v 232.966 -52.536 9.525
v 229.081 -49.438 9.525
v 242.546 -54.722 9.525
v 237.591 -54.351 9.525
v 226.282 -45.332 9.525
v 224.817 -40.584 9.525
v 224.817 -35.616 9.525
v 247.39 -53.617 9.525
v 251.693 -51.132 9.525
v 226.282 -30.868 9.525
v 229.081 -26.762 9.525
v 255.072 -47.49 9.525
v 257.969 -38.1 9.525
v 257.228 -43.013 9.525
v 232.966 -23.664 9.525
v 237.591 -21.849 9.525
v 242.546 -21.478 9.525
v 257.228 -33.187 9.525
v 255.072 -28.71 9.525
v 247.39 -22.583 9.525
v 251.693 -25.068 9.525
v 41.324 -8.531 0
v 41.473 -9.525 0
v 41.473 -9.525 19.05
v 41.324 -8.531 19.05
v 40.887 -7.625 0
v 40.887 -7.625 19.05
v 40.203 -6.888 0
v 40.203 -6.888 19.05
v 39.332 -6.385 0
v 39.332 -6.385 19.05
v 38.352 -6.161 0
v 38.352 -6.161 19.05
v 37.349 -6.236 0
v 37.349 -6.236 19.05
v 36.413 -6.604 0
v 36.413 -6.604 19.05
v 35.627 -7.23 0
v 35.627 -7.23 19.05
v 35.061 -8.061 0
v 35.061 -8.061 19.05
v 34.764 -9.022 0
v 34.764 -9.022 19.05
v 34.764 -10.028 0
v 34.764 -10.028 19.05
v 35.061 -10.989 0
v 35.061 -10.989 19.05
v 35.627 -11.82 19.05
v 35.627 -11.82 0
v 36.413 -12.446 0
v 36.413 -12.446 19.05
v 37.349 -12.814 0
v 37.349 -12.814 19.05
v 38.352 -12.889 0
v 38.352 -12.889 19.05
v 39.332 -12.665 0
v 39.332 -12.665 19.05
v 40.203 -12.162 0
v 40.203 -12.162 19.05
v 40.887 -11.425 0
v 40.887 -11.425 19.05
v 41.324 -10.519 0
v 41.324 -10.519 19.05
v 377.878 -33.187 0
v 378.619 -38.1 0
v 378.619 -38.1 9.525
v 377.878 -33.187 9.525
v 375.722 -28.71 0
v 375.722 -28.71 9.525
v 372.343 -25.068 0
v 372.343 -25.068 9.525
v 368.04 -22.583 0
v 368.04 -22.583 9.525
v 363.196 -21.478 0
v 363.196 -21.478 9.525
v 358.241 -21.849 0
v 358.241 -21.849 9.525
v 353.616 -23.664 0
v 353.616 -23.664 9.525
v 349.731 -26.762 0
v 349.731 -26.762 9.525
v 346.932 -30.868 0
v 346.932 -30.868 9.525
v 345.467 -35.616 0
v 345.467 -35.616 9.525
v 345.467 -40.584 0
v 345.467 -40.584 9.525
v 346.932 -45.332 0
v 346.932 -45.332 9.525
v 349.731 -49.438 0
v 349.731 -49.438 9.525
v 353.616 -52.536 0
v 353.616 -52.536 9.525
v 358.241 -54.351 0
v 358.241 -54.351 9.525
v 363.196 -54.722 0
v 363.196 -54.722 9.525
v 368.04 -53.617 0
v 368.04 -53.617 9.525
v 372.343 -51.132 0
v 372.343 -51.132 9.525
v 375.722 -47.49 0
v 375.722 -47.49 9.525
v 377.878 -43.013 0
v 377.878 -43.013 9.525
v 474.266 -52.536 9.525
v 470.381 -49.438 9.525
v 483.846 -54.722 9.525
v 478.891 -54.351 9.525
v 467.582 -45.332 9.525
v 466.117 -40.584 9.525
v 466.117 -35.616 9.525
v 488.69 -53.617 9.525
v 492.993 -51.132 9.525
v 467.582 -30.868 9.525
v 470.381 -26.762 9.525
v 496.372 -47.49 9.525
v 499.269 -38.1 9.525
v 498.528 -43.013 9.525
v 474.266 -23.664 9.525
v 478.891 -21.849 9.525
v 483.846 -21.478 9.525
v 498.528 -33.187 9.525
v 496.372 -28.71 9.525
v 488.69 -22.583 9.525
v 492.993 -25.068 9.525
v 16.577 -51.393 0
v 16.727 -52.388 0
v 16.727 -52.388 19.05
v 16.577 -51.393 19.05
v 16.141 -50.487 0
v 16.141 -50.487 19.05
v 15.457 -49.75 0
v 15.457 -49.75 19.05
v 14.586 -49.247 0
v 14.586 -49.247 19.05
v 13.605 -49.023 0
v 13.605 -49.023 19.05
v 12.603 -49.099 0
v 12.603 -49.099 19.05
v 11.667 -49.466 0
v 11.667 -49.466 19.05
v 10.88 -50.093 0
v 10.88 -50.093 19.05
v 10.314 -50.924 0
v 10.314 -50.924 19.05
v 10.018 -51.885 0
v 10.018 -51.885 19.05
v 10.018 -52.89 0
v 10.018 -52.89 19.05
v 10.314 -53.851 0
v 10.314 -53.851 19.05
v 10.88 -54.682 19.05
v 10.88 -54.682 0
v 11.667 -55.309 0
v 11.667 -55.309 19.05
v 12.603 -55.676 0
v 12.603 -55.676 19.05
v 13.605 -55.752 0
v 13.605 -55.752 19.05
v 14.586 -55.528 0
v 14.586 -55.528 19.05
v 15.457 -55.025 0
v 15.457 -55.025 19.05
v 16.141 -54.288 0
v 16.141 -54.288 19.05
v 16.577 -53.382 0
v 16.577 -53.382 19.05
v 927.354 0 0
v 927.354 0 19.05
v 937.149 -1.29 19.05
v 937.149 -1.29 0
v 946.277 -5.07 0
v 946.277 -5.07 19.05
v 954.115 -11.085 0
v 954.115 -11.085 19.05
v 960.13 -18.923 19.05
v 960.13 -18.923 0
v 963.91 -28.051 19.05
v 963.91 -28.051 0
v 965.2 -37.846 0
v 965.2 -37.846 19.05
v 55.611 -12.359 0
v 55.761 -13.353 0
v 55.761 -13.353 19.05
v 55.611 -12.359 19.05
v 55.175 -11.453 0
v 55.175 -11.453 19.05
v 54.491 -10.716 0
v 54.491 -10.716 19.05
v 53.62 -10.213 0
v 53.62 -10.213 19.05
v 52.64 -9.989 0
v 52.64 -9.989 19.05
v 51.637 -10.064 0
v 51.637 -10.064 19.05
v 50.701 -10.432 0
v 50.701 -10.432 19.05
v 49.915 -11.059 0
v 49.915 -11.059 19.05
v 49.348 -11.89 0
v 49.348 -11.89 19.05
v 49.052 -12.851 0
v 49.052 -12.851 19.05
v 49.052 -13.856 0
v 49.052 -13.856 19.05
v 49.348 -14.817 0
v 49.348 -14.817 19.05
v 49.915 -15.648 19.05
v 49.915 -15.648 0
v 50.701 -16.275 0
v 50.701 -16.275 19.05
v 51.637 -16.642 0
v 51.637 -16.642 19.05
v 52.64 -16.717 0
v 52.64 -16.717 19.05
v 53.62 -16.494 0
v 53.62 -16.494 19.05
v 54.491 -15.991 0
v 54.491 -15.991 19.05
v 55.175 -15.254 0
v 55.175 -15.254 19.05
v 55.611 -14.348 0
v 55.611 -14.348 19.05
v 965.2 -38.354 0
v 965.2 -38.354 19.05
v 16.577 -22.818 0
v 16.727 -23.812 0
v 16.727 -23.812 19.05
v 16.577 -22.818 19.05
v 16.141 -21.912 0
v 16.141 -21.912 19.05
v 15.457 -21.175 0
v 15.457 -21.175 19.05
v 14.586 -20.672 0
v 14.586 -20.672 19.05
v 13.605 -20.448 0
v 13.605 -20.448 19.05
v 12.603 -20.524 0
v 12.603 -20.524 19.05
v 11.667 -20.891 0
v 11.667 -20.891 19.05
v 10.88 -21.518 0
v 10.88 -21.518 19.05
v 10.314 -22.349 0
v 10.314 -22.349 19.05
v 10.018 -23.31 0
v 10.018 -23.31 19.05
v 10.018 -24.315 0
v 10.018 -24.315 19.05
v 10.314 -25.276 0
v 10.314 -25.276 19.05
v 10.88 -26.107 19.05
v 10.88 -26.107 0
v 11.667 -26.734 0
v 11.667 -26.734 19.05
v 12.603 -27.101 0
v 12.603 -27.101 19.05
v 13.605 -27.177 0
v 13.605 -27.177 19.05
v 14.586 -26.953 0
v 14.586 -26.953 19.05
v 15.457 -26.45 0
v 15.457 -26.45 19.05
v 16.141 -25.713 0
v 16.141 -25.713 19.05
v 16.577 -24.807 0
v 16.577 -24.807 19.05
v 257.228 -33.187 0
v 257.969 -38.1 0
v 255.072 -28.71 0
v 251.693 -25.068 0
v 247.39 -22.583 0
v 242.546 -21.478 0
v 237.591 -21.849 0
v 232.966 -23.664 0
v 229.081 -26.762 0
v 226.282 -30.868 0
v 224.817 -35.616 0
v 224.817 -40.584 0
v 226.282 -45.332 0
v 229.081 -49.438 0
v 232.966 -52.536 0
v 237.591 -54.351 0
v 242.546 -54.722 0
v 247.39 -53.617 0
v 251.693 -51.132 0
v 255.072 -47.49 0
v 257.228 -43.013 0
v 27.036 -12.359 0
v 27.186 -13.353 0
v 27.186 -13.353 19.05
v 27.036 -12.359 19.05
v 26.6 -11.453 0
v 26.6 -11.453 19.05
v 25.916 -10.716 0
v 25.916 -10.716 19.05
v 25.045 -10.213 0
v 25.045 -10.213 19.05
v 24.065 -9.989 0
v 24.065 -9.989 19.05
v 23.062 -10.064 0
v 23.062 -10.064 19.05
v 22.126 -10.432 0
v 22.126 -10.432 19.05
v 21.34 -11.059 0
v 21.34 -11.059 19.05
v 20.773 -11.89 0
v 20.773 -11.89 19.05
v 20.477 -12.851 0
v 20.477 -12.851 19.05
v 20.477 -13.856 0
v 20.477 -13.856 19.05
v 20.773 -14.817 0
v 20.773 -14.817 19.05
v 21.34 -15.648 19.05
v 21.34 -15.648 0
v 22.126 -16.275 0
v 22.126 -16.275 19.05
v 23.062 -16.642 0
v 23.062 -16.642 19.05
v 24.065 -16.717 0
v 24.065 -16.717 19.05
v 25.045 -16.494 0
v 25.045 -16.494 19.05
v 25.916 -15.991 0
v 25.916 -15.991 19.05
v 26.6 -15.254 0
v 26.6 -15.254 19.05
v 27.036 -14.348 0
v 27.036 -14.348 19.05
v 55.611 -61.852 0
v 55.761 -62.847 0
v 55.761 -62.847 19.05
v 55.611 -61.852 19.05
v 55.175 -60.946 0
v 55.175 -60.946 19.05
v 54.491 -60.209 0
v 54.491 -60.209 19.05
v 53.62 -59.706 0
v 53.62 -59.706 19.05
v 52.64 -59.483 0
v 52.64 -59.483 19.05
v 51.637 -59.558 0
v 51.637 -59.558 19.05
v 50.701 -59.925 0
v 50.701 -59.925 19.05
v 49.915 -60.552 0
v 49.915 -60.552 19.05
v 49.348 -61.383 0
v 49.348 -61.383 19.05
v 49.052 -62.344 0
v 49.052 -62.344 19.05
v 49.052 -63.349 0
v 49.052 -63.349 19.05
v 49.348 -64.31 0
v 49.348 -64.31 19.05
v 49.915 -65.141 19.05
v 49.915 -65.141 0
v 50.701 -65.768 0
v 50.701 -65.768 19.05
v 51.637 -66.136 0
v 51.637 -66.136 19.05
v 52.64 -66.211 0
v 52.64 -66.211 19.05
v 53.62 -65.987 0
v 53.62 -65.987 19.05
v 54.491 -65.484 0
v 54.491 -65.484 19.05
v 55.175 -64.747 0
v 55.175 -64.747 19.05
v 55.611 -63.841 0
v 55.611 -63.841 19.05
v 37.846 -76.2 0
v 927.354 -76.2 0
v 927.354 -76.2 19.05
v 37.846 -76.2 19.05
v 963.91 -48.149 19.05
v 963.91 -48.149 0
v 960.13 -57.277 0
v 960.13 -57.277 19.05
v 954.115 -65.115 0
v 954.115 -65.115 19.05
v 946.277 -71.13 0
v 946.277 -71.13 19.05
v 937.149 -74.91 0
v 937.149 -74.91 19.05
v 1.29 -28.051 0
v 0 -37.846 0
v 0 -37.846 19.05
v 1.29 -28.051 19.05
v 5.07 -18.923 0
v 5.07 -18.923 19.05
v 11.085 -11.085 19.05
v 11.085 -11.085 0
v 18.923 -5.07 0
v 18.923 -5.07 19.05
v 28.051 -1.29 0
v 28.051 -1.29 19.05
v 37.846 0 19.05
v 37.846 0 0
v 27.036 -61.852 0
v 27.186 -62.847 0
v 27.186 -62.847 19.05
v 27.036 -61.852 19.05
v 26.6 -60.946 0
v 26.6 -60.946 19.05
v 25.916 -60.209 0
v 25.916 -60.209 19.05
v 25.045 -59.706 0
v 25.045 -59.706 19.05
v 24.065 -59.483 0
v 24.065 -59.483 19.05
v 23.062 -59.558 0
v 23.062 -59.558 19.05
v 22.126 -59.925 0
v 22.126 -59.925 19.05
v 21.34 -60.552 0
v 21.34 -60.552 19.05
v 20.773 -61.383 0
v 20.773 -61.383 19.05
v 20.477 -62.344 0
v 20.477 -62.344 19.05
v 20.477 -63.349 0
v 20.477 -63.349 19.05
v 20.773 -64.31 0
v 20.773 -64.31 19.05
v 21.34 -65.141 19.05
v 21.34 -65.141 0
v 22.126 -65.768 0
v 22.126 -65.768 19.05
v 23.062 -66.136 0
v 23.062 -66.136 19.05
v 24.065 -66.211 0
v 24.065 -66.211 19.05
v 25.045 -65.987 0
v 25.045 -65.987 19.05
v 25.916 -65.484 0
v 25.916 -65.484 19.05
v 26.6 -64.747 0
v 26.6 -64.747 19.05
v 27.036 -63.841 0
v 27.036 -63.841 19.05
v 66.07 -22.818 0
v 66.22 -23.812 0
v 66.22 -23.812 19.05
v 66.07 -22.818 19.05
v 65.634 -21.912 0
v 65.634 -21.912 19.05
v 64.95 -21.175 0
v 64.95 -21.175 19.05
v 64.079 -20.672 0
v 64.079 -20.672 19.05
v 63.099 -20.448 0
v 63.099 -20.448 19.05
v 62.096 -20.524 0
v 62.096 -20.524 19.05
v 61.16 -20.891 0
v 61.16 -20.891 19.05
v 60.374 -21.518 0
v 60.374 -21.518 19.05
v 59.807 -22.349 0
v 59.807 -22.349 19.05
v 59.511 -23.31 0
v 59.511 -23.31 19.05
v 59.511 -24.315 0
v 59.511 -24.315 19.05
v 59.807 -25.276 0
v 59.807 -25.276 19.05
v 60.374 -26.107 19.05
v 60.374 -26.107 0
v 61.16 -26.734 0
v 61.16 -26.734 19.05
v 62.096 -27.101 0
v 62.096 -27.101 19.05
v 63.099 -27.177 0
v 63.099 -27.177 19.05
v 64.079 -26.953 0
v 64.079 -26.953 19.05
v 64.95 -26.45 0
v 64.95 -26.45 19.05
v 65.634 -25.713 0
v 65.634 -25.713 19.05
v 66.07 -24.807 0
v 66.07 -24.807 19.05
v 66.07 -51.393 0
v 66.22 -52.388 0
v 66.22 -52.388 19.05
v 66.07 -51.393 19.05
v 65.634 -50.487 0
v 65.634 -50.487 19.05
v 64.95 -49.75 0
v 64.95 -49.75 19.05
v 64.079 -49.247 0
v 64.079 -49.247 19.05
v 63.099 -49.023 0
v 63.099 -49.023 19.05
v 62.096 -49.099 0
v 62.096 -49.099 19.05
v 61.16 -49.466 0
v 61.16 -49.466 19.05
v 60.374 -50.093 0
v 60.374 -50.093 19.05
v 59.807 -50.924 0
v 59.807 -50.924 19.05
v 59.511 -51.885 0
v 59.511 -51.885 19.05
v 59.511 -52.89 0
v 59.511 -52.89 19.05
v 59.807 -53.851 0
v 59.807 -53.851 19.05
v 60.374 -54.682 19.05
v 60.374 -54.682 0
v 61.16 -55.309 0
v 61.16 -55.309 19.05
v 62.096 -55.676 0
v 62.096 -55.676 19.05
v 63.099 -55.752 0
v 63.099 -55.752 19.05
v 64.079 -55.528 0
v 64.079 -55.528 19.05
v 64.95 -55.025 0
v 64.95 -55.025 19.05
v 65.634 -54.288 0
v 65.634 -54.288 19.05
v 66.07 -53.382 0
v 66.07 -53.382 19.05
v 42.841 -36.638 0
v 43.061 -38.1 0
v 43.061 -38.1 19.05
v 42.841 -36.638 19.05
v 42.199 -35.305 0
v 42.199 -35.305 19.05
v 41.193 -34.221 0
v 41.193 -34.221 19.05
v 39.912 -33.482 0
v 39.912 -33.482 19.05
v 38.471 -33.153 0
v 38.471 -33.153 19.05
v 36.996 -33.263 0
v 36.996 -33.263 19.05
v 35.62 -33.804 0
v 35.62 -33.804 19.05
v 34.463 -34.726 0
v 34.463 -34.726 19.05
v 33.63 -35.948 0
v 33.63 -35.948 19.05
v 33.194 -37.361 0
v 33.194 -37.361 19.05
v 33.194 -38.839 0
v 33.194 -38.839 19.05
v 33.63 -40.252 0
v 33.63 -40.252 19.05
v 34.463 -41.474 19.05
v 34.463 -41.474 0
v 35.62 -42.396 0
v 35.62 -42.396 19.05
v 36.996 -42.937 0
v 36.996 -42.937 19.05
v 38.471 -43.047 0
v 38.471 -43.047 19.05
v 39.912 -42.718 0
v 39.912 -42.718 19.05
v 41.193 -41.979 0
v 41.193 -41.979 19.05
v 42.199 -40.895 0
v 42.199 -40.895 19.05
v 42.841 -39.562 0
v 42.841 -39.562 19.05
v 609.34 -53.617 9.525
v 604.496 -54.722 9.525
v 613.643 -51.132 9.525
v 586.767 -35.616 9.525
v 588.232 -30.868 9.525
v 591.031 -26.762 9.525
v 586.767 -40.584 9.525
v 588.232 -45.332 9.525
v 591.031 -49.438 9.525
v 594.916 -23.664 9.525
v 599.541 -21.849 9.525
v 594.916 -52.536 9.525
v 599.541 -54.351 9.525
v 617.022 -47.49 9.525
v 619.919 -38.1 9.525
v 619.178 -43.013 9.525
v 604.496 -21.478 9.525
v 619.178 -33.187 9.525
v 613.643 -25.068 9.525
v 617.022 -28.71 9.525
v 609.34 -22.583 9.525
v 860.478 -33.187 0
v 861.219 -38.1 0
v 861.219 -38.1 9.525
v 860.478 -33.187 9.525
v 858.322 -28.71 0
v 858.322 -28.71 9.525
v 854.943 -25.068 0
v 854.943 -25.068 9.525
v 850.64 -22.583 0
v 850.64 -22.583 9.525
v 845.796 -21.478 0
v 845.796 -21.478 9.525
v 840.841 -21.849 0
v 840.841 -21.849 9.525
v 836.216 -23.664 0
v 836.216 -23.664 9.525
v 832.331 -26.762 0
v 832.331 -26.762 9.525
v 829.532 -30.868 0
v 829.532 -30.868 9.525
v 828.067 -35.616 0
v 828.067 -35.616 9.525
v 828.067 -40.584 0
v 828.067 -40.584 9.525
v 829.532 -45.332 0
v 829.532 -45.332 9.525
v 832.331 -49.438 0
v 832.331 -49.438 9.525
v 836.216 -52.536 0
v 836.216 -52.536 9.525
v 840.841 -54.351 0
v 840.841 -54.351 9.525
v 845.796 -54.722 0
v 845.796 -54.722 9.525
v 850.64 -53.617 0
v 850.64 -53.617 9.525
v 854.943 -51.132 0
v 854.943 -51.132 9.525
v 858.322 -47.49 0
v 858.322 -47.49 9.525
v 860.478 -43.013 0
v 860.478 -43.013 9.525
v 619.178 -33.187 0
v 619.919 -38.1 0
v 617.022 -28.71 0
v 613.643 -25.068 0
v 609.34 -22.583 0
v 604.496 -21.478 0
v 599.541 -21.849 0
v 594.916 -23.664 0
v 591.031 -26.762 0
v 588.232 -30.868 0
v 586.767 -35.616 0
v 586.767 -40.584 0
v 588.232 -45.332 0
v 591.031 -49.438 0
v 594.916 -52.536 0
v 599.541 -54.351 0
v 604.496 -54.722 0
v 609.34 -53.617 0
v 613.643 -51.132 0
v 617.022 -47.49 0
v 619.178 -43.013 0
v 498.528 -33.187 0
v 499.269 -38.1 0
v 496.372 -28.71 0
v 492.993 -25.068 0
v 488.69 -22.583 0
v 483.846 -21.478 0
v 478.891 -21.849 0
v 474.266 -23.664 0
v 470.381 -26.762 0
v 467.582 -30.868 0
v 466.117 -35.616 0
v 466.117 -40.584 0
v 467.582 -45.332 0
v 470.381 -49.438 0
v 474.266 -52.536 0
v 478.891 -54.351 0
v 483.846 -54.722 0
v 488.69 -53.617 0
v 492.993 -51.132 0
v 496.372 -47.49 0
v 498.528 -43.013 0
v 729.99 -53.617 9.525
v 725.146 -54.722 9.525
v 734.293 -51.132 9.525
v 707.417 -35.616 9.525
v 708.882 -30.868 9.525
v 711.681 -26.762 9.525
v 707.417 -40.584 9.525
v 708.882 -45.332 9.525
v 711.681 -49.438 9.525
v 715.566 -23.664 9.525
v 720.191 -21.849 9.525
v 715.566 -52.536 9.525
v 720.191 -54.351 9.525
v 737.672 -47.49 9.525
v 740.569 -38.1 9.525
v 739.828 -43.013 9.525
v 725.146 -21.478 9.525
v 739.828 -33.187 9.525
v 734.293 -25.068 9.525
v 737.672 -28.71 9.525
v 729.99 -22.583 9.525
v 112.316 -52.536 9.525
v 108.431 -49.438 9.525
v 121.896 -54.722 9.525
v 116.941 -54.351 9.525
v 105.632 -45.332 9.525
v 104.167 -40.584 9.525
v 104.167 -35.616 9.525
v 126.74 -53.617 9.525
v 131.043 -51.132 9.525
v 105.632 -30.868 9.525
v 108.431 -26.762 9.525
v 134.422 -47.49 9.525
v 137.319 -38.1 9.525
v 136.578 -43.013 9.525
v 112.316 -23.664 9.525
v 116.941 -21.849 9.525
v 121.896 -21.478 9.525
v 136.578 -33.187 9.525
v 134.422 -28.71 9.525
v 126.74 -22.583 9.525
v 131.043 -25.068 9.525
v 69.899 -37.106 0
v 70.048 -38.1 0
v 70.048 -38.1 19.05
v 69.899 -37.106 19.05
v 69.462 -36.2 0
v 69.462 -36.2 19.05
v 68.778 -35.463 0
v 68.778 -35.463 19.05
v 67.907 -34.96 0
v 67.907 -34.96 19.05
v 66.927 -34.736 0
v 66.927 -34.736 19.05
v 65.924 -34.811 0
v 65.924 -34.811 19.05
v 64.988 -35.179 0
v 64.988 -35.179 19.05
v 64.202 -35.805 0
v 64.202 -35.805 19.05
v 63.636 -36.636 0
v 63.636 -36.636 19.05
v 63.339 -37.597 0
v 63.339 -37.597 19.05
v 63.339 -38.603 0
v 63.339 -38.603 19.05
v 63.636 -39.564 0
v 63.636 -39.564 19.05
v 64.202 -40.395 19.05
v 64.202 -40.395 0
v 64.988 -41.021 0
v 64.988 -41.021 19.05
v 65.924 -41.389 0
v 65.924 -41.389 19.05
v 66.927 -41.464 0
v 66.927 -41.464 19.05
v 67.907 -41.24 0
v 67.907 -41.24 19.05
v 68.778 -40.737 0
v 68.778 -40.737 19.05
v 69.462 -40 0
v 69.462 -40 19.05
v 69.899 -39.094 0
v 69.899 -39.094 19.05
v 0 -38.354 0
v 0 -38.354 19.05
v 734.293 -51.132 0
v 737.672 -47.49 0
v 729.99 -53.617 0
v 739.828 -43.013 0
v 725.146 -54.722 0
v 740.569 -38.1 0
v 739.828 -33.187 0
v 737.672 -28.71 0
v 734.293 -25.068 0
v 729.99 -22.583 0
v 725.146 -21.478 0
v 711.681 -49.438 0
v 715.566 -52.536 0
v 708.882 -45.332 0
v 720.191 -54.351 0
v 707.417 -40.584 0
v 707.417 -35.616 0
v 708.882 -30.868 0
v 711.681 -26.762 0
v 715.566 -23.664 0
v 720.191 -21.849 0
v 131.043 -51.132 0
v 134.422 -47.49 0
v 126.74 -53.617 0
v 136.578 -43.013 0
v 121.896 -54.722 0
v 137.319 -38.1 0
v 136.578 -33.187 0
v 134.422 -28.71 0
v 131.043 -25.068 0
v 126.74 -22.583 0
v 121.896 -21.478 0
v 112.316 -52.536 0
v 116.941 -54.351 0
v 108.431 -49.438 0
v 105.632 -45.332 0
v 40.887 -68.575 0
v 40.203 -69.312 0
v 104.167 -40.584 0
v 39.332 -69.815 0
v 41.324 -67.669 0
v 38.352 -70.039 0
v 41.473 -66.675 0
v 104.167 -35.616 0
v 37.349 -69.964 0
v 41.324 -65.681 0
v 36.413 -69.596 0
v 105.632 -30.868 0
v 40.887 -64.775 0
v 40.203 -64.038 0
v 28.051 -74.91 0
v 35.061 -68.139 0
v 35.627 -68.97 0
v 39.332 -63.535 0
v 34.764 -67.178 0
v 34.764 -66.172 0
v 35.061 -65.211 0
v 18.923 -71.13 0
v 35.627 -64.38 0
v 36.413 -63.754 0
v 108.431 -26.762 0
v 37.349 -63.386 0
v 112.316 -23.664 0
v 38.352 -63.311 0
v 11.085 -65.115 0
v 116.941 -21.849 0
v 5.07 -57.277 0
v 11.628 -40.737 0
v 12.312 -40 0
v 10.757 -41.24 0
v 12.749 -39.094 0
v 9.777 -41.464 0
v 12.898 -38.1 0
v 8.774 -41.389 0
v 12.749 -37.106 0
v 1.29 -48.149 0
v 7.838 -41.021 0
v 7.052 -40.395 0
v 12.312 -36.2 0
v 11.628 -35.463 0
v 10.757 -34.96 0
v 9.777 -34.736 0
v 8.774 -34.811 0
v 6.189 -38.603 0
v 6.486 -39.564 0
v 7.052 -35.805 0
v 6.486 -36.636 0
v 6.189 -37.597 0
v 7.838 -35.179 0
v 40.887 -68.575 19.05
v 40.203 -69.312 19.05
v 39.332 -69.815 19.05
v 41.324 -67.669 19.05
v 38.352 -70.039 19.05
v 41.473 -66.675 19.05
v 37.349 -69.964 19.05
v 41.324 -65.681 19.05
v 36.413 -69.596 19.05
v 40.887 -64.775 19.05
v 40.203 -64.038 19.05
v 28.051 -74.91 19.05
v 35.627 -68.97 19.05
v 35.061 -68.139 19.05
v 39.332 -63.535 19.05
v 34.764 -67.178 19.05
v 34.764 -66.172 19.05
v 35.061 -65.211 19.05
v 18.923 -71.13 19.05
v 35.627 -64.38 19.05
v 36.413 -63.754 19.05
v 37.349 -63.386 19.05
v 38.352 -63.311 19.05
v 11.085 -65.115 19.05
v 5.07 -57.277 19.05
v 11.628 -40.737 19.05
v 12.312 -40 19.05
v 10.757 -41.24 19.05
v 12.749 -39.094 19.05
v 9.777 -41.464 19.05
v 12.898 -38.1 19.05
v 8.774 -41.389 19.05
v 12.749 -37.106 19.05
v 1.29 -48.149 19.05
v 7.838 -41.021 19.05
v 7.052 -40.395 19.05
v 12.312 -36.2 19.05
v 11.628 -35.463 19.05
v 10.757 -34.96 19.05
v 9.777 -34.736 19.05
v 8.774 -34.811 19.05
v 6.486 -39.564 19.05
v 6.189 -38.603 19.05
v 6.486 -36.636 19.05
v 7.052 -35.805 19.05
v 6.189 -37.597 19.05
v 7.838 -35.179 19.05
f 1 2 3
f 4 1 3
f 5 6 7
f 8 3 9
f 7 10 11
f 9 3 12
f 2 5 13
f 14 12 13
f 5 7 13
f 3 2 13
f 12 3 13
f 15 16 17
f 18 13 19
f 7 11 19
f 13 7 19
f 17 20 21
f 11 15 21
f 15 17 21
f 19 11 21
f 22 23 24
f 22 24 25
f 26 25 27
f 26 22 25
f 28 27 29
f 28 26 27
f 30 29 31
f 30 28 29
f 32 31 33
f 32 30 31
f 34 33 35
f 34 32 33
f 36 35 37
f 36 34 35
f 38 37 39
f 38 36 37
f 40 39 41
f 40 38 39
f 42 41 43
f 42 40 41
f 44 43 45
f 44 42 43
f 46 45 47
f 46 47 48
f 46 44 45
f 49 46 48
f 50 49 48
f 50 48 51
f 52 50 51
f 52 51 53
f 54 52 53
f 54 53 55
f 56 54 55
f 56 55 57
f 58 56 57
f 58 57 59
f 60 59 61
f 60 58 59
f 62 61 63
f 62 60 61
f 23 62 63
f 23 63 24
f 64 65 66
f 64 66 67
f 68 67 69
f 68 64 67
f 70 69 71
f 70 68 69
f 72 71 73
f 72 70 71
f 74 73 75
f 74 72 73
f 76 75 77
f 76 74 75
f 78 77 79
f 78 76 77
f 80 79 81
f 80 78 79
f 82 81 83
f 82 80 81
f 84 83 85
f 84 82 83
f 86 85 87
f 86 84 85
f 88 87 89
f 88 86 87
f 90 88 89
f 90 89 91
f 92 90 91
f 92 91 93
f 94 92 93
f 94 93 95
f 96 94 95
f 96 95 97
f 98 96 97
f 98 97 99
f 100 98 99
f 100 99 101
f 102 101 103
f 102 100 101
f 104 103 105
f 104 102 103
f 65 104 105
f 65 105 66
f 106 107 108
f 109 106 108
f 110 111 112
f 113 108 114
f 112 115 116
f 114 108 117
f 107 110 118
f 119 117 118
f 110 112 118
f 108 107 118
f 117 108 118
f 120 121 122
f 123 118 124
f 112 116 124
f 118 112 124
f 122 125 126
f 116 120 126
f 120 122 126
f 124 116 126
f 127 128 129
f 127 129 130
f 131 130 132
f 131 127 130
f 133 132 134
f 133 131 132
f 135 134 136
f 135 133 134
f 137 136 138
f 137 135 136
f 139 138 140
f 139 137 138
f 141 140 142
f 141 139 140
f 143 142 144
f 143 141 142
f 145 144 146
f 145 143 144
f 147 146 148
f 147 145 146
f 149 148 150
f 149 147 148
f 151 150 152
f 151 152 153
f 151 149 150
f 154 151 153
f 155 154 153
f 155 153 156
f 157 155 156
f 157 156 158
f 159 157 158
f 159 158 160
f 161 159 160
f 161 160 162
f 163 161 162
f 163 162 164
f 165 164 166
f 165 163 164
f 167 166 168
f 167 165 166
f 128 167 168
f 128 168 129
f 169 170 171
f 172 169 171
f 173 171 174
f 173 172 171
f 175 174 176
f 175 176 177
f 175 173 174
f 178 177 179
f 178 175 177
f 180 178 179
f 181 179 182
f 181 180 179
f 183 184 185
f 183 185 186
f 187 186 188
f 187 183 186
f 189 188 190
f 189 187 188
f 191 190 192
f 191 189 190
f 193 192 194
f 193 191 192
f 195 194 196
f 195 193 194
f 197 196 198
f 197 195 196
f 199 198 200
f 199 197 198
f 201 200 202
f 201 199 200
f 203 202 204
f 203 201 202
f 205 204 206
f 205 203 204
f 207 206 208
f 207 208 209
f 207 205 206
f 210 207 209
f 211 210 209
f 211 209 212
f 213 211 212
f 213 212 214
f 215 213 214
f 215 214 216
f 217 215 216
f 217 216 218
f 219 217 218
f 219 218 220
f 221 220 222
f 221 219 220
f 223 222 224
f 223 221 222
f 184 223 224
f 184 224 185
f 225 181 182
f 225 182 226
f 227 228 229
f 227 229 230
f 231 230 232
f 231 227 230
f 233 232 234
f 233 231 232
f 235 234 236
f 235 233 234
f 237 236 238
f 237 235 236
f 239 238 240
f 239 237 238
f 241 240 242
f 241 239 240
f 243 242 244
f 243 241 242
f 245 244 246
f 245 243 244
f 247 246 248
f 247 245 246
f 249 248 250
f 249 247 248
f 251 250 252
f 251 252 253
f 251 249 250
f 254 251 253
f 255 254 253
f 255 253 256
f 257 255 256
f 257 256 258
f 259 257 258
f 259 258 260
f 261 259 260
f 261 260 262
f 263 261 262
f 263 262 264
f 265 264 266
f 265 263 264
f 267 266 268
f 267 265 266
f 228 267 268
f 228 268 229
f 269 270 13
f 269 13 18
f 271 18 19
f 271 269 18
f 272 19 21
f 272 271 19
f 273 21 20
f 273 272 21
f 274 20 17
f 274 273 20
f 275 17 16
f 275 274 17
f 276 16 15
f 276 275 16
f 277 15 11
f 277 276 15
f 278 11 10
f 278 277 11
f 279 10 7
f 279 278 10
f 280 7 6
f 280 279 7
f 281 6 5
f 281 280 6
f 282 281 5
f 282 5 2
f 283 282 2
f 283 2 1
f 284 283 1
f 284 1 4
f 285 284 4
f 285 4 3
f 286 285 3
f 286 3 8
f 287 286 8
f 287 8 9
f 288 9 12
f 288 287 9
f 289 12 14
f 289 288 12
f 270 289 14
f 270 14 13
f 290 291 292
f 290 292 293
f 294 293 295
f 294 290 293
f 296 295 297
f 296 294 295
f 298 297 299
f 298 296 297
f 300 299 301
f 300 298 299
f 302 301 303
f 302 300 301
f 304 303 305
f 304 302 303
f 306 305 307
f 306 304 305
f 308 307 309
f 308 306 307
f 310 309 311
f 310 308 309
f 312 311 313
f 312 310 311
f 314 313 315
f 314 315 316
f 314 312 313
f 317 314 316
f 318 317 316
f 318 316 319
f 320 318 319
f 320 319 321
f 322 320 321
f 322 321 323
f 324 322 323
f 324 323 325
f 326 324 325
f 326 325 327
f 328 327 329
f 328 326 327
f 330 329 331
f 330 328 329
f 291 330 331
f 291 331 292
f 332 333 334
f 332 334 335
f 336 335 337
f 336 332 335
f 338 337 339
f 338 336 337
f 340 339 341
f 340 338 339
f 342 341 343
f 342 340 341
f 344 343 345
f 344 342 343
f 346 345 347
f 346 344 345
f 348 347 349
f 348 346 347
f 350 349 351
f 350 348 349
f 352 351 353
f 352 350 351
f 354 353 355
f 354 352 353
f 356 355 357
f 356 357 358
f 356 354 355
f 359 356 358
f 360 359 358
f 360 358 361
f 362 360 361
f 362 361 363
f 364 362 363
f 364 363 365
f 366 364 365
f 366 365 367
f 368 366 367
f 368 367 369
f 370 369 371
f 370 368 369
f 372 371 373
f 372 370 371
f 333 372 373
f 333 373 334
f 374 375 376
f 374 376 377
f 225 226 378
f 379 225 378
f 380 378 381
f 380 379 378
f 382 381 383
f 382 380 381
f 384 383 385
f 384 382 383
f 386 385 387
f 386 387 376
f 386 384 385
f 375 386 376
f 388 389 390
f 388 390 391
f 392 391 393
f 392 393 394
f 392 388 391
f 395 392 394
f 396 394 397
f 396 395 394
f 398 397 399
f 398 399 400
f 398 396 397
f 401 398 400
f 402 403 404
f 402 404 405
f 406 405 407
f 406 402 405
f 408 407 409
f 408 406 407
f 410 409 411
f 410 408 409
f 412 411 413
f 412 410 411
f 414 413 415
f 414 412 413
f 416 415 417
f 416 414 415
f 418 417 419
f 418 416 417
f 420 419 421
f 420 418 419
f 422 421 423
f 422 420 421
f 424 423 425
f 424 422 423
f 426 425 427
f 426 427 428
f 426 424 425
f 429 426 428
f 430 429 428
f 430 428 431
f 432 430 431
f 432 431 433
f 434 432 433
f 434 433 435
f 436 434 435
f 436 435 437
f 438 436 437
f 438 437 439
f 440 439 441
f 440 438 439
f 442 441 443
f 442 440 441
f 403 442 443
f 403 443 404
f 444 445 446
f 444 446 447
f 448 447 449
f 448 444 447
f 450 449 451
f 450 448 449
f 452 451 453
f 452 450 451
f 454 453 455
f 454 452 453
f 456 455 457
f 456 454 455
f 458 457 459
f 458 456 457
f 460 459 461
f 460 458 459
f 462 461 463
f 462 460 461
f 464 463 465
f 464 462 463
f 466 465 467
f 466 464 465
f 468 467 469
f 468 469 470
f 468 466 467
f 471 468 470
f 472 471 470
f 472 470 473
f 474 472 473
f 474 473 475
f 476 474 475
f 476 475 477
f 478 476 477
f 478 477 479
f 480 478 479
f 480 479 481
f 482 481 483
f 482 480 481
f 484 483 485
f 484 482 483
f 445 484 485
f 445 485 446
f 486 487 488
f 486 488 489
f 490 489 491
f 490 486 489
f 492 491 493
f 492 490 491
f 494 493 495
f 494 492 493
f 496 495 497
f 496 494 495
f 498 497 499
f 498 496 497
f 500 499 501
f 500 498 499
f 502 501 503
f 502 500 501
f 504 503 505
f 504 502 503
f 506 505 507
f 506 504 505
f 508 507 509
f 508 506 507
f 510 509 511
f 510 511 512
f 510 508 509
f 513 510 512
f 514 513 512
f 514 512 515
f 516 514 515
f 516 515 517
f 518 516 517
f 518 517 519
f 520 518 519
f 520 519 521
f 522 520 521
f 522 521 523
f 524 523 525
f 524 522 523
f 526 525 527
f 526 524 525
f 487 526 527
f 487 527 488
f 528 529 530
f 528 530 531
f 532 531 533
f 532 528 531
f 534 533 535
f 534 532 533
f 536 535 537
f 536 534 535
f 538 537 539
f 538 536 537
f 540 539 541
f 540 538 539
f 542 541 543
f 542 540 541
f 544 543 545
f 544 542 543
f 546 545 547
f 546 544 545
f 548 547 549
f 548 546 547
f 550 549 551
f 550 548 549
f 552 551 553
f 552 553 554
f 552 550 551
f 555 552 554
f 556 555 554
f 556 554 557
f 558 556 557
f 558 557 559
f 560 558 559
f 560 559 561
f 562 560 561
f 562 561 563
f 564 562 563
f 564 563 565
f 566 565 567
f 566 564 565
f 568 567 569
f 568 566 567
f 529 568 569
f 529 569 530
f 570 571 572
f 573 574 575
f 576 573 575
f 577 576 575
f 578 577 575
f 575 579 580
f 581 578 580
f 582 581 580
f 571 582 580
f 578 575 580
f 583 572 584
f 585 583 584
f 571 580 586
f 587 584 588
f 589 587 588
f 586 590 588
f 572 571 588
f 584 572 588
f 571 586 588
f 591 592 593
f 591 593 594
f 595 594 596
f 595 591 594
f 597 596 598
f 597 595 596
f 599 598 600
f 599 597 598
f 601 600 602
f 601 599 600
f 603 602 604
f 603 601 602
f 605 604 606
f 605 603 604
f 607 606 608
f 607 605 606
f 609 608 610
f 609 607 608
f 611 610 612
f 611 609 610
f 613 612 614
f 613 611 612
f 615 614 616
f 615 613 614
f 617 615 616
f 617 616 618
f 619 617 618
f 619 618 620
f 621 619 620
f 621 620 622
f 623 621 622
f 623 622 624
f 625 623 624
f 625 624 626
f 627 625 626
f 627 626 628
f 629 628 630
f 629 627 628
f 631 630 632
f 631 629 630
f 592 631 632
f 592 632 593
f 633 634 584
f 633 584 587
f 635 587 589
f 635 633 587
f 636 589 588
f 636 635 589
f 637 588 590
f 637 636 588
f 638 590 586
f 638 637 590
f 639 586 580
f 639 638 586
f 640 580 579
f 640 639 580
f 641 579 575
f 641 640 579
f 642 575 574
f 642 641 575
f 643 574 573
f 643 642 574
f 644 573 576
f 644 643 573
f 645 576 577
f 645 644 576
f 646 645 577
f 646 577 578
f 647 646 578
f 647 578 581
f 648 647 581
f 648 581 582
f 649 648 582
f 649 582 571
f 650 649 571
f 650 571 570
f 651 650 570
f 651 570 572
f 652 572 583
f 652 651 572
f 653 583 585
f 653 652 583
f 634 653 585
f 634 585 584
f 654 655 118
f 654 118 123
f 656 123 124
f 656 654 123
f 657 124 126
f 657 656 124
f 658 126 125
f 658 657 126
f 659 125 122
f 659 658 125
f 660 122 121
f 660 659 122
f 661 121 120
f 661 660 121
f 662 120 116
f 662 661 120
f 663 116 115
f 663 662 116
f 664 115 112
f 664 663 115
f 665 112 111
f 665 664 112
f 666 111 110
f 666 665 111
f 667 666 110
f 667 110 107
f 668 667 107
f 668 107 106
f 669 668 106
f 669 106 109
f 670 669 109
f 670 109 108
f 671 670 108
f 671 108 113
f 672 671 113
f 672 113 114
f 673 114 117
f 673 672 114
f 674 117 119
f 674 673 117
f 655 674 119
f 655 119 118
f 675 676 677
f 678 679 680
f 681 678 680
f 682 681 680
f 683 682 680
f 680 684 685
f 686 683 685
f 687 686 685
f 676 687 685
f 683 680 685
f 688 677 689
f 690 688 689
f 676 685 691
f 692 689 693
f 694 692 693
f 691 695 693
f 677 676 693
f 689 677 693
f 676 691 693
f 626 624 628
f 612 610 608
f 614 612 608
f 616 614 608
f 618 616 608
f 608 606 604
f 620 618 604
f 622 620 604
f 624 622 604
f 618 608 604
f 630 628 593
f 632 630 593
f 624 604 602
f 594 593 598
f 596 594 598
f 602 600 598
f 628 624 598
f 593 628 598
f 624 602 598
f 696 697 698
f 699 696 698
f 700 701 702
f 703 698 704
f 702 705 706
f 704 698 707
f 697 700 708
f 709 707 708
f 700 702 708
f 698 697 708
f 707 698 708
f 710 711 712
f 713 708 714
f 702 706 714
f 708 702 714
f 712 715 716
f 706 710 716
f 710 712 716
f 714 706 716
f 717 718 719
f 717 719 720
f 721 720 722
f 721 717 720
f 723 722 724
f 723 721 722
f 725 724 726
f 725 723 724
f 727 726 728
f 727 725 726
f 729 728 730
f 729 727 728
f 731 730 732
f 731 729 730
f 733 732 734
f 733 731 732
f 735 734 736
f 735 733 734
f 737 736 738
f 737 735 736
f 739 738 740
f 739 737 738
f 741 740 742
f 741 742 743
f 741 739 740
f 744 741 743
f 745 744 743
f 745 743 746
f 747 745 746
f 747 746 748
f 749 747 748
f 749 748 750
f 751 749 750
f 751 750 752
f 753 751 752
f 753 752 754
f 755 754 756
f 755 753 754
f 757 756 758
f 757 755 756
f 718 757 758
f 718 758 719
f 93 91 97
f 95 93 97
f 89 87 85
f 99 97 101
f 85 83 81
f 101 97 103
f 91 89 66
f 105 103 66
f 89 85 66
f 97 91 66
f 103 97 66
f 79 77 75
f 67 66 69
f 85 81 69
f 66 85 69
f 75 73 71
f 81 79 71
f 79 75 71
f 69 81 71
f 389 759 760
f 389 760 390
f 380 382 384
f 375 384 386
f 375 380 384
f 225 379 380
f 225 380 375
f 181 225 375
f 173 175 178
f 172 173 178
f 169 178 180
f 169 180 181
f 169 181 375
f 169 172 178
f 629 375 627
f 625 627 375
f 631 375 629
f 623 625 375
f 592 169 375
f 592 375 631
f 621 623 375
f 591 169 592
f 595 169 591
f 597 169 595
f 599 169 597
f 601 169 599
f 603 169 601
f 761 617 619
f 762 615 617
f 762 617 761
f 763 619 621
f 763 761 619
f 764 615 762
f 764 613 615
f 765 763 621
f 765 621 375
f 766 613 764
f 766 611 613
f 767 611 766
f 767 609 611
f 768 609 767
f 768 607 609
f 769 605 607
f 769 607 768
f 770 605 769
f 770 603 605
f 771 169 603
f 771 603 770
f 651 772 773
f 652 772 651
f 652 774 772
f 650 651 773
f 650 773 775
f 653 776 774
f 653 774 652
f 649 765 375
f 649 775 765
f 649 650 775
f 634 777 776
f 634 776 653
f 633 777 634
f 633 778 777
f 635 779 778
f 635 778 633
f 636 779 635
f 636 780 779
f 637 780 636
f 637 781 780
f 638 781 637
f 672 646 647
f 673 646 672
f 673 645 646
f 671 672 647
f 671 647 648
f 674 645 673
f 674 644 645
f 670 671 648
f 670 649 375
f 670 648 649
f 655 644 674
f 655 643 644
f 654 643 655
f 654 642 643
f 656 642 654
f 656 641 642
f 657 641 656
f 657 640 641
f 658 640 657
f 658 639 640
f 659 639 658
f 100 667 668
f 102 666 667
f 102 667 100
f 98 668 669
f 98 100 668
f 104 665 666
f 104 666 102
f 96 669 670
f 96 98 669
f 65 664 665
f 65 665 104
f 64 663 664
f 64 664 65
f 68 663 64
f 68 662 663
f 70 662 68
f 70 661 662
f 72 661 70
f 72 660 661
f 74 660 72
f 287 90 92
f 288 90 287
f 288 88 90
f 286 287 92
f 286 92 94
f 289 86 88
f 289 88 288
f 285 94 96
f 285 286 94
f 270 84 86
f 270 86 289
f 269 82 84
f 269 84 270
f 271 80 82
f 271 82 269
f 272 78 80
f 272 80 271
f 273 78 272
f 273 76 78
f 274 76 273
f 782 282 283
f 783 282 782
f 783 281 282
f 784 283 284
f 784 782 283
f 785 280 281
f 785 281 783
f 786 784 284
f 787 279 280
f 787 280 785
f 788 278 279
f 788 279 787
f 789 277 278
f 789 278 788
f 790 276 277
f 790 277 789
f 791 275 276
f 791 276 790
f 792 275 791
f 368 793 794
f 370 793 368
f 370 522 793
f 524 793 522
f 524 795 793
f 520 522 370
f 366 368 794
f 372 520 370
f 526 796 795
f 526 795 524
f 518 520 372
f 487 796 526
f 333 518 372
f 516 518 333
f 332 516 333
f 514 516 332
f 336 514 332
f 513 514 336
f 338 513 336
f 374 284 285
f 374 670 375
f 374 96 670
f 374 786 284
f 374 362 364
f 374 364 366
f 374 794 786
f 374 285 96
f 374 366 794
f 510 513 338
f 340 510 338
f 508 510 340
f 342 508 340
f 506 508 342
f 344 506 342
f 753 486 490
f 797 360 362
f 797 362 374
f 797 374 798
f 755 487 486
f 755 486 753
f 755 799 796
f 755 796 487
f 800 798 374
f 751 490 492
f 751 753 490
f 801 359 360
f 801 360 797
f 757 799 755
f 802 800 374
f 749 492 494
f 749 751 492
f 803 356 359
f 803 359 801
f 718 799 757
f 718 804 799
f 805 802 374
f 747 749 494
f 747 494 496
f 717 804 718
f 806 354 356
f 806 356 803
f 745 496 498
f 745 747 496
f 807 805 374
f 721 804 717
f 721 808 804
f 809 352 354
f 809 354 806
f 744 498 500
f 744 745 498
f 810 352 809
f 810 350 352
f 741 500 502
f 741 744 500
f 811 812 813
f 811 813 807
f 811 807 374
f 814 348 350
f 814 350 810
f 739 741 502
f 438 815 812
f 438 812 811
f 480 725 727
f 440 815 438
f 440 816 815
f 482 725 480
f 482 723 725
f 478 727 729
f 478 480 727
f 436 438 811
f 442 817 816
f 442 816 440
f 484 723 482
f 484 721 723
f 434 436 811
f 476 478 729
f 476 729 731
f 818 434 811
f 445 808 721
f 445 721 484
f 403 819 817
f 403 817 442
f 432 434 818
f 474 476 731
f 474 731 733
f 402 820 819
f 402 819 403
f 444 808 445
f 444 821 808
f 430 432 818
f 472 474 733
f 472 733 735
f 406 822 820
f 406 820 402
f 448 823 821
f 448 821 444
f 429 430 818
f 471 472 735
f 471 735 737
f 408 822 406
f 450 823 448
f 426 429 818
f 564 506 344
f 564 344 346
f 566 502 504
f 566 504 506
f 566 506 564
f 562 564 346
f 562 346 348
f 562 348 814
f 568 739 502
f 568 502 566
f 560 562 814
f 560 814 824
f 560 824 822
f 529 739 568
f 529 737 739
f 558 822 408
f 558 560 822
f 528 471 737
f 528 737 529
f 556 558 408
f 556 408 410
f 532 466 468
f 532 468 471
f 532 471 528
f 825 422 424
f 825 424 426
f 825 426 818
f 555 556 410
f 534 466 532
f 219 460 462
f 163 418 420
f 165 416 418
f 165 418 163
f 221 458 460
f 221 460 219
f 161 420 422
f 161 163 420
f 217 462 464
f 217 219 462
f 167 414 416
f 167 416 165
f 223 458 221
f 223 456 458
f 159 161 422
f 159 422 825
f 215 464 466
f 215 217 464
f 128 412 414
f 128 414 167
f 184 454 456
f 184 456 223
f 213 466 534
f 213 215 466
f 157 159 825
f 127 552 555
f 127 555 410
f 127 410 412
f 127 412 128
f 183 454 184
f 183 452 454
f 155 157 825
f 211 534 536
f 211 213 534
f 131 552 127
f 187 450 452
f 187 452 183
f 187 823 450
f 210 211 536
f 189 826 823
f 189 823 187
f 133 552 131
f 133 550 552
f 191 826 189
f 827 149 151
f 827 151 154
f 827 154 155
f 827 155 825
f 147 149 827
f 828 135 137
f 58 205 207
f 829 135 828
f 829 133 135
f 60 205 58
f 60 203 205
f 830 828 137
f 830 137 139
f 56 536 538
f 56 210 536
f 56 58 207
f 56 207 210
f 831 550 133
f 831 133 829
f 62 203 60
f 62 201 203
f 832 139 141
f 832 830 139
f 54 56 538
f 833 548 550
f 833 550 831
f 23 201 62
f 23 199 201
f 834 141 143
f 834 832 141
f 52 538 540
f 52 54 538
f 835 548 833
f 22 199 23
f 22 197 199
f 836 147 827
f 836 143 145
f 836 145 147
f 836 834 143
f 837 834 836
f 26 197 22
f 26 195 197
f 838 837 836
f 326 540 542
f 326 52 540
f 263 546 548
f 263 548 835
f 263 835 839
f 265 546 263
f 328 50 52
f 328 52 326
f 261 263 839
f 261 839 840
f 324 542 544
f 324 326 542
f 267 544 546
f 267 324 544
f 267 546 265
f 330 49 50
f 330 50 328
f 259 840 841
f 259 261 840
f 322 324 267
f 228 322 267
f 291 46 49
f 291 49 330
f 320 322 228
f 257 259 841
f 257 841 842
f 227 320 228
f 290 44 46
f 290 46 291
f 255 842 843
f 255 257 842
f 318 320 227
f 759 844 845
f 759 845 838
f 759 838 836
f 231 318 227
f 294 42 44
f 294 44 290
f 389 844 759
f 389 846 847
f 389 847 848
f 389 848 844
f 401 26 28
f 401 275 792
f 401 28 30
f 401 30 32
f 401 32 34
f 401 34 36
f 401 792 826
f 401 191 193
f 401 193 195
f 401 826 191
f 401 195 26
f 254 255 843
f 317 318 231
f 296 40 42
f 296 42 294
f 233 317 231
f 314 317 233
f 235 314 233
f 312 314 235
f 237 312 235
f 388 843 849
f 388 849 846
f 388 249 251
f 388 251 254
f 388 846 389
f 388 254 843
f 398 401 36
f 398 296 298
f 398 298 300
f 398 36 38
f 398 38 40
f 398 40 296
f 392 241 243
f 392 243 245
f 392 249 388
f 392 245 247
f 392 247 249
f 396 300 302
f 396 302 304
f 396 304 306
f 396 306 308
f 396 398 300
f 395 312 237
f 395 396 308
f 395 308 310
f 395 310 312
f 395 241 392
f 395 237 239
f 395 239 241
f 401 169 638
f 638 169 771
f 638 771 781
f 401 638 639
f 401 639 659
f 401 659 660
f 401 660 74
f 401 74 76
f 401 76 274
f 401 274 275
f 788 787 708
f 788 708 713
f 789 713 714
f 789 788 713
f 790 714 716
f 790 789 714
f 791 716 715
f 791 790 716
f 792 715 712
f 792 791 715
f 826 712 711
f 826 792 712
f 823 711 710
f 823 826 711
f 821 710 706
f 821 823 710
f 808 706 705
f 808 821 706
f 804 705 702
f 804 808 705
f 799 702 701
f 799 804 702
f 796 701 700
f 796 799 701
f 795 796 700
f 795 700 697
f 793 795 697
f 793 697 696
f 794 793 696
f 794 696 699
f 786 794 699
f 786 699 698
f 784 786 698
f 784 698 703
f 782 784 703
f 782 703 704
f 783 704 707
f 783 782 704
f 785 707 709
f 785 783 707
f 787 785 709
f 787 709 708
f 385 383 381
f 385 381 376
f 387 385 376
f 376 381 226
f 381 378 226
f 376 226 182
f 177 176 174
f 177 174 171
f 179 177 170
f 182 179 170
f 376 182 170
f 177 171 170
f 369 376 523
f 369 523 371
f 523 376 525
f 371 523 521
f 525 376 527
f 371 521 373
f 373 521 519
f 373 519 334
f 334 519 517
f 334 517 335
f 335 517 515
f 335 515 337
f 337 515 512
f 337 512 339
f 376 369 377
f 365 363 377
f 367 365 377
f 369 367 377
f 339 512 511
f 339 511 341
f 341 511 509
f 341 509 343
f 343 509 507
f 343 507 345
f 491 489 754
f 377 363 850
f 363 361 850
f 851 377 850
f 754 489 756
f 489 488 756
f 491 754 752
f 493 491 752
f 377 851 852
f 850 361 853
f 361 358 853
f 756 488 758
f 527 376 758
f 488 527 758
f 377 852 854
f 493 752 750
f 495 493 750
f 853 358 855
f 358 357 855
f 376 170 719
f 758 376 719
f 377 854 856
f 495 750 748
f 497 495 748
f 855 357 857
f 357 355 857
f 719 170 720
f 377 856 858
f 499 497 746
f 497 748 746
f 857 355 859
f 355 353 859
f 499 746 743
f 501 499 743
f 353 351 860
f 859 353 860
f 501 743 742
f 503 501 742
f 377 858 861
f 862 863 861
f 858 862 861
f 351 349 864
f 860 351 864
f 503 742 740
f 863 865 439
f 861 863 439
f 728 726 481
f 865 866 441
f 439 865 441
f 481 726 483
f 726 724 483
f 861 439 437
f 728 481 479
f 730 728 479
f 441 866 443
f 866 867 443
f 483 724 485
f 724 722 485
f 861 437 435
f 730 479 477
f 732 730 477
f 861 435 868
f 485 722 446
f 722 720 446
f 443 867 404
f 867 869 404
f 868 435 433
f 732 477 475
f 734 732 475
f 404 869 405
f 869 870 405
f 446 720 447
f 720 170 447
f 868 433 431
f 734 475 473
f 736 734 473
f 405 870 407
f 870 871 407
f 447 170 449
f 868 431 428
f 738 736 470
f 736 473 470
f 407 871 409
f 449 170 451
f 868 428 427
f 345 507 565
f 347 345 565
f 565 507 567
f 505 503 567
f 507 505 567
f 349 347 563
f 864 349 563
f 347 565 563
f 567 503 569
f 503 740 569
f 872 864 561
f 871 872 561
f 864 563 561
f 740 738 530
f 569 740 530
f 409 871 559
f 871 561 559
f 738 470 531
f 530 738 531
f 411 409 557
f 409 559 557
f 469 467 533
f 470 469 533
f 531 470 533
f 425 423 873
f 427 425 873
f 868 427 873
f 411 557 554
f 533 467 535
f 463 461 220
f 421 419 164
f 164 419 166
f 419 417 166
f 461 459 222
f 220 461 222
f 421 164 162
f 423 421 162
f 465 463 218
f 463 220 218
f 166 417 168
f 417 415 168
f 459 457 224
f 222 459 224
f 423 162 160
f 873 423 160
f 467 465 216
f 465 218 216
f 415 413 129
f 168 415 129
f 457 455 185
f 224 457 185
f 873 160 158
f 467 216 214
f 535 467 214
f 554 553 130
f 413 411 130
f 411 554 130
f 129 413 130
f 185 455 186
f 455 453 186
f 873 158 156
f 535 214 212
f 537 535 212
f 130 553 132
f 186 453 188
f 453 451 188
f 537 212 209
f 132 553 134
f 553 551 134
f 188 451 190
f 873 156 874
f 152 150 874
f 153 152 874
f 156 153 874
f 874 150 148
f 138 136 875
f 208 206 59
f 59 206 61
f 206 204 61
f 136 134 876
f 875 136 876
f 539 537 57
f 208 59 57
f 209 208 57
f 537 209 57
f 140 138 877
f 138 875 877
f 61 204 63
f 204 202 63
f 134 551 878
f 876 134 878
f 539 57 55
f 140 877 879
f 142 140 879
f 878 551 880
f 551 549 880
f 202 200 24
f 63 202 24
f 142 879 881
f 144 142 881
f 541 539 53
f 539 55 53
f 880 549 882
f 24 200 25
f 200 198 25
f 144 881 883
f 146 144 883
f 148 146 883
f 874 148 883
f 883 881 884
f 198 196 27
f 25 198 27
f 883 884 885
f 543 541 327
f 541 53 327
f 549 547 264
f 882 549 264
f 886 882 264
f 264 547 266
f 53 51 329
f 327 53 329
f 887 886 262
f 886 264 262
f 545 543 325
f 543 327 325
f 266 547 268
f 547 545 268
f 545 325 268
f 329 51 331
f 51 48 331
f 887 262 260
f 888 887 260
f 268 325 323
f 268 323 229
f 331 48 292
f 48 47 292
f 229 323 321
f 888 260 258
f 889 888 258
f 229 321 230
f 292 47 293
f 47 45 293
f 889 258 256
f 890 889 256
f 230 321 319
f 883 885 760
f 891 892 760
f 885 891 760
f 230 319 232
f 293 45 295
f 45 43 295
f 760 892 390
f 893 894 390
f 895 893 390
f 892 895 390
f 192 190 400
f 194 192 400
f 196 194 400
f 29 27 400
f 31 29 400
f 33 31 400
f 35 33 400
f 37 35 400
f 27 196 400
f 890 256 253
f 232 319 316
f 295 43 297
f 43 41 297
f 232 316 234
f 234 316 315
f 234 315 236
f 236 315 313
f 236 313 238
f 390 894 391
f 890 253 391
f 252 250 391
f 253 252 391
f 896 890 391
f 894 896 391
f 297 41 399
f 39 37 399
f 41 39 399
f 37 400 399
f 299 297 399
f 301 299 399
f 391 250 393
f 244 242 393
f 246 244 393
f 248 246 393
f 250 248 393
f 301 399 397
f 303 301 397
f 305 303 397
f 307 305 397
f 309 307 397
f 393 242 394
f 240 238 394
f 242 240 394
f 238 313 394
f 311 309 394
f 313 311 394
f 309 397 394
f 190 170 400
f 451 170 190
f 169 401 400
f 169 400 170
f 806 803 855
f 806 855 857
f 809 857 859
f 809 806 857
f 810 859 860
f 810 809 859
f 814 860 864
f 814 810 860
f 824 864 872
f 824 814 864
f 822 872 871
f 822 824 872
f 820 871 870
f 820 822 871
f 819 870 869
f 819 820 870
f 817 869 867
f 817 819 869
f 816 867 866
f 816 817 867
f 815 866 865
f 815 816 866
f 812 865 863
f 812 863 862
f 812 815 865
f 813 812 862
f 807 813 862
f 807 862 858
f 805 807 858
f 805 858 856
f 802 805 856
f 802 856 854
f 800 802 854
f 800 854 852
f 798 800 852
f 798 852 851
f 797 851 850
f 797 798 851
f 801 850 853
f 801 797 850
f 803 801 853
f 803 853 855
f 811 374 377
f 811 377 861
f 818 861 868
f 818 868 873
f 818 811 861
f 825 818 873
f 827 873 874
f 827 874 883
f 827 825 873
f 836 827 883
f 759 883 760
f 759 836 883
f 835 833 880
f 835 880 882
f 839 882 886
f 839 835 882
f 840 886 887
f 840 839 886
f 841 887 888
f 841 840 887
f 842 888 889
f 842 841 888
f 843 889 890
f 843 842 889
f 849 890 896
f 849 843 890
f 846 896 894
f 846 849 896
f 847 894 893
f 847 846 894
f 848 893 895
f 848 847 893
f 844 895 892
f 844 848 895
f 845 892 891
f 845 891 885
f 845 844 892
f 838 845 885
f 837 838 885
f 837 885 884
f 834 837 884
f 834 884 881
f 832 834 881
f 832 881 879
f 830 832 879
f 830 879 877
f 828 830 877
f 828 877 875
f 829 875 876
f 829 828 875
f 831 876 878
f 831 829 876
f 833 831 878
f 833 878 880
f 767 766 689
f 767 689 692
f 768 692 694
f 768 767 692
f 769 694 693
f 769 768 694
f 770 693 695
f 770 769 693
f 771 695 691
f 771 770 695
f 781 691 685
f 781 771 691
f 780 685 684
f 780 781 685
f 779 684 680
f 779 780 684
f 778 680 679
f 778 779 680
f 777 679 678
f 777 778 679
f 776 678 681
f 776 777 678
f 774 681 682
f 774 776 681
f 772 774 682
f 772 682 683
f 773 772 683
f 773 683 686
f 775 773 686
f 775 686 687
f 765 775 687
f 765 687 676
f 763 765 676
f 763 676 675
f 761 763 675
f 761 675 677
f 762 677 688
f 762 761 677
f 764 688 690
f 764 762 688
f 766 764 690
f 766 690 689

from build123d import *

# Parameters (mm, degrees)
BOSS_EXTRUDE1_DEPTH = 19.05
SKETCH3_R           = 16.66875
CUT_EXTRUDE1_DEPTH  = 9.525
SKETCH5_R           = 4.9609375
SKETCH5_R_2         = 3.3734375
CUT_EXTRUDE10_DEPTH = 19.05


with BuildPart() as part:
    # Sketch2 → Boss-Extrude1 (new body)
    with BuildSketch(Plane.XY):
        with BuildLine():
            Line((37.846, 0), (927.354, 0))
            ThreePointArc((927.354, 0), (954.115163241, -11.084836759), (965.2, -37.846))
            Line((965.2, -37.846), (965.2, -38.354))
            ThreePointArc((965.2, -38.354), (954.115163241, -65.115163241), (927.354, -76.2))
            Line((927.354, -76.2), (37.846, -76.2))
            ThreePointArc((37.846, -76.2), (11.084836759, -65.115163241), (0, -38.354))
            Line((0, -38.354), (0, -37.846))
            ThreePointArc((0, -37.846), (11.084836759, -11.084836759), (37.846, 0))
        make_face()
    extrude(amount=BOSS_EXTRUDE1_DEPTH)

    # Sketch3 → Cut-Extrude1 (cut)
    with BuildSketch(Plane.XY):
        with Locations((120.65, -38.1)):
            Circle(SKETCH3_R)
        with Locations((241.3, -38.1)):
            Circle(SKETCH3_R)
        with Locations((361.95, -38.1)):
            Circle(SKETCH3_R)
        with Locations((844.55, -38.1)):
            Circle(SKETCH3_R)
        with Locations((723.9, -38.1)):
            Circle(SKETCH3_R)
        with Locations((603.25, -38.1)):
            Circle(SKETCH3_R)
        with Locations((482.6, -38.1)):
            Circle(SKETCH3_R)
    extrude(amount=CUT_EXTRUDE1_DEPTH, mode=Mode.SUBTRACT)

    # Sketch5 → Cut-Extrude10 (cut)
    with BuildSketch(Plane.XY):
        with Locations((38.1, -38.1)):
            Circle(SKETCH5_R)
        with Locations((66.675, -38.1)):
            Circle(SKETCH5_R_2)
        with Locations((62.846675913, -52.3875)):
            Circle(SKETCH5_R_2)
        with Locations((52.3875, -62.846675913)):
            Circle(SKETCH5_R_2)
        with Locations((38.1, -66.675)):
            Circle(SKETCH5_R_2)
        with Locations((23.8125, -62.846675913)):
            Circle(SKETCH5_R_2)
        with Locations((13.353324087, -52.3875)):
            Circle(SKETCH5_R_2)
        with Locations((9.525, -38.1)):
            Circle(SKETCH5_R_2)
        with Locations((13.353324087, -23.8125)):
            Circle(SKETCH5_R_2)
        with Locations((23.8125, -13.353324087)):
            Circle(SKETCH5_R_2)
        with Locations((38.1, -9.525)):
            Circle(SKETCH5_R_2)
        with Locations((52.3875, -13.353324087)):
            Circle(SKETCH5_R_2)
        with Locations((62.846675913, -23.8125)):
            Circle(SKETCH5_R_2)
    extrude(amount=CUT_EXTRUDE10_DEPTH, mode=Mode.SUBTRACT)


solid = part.part
